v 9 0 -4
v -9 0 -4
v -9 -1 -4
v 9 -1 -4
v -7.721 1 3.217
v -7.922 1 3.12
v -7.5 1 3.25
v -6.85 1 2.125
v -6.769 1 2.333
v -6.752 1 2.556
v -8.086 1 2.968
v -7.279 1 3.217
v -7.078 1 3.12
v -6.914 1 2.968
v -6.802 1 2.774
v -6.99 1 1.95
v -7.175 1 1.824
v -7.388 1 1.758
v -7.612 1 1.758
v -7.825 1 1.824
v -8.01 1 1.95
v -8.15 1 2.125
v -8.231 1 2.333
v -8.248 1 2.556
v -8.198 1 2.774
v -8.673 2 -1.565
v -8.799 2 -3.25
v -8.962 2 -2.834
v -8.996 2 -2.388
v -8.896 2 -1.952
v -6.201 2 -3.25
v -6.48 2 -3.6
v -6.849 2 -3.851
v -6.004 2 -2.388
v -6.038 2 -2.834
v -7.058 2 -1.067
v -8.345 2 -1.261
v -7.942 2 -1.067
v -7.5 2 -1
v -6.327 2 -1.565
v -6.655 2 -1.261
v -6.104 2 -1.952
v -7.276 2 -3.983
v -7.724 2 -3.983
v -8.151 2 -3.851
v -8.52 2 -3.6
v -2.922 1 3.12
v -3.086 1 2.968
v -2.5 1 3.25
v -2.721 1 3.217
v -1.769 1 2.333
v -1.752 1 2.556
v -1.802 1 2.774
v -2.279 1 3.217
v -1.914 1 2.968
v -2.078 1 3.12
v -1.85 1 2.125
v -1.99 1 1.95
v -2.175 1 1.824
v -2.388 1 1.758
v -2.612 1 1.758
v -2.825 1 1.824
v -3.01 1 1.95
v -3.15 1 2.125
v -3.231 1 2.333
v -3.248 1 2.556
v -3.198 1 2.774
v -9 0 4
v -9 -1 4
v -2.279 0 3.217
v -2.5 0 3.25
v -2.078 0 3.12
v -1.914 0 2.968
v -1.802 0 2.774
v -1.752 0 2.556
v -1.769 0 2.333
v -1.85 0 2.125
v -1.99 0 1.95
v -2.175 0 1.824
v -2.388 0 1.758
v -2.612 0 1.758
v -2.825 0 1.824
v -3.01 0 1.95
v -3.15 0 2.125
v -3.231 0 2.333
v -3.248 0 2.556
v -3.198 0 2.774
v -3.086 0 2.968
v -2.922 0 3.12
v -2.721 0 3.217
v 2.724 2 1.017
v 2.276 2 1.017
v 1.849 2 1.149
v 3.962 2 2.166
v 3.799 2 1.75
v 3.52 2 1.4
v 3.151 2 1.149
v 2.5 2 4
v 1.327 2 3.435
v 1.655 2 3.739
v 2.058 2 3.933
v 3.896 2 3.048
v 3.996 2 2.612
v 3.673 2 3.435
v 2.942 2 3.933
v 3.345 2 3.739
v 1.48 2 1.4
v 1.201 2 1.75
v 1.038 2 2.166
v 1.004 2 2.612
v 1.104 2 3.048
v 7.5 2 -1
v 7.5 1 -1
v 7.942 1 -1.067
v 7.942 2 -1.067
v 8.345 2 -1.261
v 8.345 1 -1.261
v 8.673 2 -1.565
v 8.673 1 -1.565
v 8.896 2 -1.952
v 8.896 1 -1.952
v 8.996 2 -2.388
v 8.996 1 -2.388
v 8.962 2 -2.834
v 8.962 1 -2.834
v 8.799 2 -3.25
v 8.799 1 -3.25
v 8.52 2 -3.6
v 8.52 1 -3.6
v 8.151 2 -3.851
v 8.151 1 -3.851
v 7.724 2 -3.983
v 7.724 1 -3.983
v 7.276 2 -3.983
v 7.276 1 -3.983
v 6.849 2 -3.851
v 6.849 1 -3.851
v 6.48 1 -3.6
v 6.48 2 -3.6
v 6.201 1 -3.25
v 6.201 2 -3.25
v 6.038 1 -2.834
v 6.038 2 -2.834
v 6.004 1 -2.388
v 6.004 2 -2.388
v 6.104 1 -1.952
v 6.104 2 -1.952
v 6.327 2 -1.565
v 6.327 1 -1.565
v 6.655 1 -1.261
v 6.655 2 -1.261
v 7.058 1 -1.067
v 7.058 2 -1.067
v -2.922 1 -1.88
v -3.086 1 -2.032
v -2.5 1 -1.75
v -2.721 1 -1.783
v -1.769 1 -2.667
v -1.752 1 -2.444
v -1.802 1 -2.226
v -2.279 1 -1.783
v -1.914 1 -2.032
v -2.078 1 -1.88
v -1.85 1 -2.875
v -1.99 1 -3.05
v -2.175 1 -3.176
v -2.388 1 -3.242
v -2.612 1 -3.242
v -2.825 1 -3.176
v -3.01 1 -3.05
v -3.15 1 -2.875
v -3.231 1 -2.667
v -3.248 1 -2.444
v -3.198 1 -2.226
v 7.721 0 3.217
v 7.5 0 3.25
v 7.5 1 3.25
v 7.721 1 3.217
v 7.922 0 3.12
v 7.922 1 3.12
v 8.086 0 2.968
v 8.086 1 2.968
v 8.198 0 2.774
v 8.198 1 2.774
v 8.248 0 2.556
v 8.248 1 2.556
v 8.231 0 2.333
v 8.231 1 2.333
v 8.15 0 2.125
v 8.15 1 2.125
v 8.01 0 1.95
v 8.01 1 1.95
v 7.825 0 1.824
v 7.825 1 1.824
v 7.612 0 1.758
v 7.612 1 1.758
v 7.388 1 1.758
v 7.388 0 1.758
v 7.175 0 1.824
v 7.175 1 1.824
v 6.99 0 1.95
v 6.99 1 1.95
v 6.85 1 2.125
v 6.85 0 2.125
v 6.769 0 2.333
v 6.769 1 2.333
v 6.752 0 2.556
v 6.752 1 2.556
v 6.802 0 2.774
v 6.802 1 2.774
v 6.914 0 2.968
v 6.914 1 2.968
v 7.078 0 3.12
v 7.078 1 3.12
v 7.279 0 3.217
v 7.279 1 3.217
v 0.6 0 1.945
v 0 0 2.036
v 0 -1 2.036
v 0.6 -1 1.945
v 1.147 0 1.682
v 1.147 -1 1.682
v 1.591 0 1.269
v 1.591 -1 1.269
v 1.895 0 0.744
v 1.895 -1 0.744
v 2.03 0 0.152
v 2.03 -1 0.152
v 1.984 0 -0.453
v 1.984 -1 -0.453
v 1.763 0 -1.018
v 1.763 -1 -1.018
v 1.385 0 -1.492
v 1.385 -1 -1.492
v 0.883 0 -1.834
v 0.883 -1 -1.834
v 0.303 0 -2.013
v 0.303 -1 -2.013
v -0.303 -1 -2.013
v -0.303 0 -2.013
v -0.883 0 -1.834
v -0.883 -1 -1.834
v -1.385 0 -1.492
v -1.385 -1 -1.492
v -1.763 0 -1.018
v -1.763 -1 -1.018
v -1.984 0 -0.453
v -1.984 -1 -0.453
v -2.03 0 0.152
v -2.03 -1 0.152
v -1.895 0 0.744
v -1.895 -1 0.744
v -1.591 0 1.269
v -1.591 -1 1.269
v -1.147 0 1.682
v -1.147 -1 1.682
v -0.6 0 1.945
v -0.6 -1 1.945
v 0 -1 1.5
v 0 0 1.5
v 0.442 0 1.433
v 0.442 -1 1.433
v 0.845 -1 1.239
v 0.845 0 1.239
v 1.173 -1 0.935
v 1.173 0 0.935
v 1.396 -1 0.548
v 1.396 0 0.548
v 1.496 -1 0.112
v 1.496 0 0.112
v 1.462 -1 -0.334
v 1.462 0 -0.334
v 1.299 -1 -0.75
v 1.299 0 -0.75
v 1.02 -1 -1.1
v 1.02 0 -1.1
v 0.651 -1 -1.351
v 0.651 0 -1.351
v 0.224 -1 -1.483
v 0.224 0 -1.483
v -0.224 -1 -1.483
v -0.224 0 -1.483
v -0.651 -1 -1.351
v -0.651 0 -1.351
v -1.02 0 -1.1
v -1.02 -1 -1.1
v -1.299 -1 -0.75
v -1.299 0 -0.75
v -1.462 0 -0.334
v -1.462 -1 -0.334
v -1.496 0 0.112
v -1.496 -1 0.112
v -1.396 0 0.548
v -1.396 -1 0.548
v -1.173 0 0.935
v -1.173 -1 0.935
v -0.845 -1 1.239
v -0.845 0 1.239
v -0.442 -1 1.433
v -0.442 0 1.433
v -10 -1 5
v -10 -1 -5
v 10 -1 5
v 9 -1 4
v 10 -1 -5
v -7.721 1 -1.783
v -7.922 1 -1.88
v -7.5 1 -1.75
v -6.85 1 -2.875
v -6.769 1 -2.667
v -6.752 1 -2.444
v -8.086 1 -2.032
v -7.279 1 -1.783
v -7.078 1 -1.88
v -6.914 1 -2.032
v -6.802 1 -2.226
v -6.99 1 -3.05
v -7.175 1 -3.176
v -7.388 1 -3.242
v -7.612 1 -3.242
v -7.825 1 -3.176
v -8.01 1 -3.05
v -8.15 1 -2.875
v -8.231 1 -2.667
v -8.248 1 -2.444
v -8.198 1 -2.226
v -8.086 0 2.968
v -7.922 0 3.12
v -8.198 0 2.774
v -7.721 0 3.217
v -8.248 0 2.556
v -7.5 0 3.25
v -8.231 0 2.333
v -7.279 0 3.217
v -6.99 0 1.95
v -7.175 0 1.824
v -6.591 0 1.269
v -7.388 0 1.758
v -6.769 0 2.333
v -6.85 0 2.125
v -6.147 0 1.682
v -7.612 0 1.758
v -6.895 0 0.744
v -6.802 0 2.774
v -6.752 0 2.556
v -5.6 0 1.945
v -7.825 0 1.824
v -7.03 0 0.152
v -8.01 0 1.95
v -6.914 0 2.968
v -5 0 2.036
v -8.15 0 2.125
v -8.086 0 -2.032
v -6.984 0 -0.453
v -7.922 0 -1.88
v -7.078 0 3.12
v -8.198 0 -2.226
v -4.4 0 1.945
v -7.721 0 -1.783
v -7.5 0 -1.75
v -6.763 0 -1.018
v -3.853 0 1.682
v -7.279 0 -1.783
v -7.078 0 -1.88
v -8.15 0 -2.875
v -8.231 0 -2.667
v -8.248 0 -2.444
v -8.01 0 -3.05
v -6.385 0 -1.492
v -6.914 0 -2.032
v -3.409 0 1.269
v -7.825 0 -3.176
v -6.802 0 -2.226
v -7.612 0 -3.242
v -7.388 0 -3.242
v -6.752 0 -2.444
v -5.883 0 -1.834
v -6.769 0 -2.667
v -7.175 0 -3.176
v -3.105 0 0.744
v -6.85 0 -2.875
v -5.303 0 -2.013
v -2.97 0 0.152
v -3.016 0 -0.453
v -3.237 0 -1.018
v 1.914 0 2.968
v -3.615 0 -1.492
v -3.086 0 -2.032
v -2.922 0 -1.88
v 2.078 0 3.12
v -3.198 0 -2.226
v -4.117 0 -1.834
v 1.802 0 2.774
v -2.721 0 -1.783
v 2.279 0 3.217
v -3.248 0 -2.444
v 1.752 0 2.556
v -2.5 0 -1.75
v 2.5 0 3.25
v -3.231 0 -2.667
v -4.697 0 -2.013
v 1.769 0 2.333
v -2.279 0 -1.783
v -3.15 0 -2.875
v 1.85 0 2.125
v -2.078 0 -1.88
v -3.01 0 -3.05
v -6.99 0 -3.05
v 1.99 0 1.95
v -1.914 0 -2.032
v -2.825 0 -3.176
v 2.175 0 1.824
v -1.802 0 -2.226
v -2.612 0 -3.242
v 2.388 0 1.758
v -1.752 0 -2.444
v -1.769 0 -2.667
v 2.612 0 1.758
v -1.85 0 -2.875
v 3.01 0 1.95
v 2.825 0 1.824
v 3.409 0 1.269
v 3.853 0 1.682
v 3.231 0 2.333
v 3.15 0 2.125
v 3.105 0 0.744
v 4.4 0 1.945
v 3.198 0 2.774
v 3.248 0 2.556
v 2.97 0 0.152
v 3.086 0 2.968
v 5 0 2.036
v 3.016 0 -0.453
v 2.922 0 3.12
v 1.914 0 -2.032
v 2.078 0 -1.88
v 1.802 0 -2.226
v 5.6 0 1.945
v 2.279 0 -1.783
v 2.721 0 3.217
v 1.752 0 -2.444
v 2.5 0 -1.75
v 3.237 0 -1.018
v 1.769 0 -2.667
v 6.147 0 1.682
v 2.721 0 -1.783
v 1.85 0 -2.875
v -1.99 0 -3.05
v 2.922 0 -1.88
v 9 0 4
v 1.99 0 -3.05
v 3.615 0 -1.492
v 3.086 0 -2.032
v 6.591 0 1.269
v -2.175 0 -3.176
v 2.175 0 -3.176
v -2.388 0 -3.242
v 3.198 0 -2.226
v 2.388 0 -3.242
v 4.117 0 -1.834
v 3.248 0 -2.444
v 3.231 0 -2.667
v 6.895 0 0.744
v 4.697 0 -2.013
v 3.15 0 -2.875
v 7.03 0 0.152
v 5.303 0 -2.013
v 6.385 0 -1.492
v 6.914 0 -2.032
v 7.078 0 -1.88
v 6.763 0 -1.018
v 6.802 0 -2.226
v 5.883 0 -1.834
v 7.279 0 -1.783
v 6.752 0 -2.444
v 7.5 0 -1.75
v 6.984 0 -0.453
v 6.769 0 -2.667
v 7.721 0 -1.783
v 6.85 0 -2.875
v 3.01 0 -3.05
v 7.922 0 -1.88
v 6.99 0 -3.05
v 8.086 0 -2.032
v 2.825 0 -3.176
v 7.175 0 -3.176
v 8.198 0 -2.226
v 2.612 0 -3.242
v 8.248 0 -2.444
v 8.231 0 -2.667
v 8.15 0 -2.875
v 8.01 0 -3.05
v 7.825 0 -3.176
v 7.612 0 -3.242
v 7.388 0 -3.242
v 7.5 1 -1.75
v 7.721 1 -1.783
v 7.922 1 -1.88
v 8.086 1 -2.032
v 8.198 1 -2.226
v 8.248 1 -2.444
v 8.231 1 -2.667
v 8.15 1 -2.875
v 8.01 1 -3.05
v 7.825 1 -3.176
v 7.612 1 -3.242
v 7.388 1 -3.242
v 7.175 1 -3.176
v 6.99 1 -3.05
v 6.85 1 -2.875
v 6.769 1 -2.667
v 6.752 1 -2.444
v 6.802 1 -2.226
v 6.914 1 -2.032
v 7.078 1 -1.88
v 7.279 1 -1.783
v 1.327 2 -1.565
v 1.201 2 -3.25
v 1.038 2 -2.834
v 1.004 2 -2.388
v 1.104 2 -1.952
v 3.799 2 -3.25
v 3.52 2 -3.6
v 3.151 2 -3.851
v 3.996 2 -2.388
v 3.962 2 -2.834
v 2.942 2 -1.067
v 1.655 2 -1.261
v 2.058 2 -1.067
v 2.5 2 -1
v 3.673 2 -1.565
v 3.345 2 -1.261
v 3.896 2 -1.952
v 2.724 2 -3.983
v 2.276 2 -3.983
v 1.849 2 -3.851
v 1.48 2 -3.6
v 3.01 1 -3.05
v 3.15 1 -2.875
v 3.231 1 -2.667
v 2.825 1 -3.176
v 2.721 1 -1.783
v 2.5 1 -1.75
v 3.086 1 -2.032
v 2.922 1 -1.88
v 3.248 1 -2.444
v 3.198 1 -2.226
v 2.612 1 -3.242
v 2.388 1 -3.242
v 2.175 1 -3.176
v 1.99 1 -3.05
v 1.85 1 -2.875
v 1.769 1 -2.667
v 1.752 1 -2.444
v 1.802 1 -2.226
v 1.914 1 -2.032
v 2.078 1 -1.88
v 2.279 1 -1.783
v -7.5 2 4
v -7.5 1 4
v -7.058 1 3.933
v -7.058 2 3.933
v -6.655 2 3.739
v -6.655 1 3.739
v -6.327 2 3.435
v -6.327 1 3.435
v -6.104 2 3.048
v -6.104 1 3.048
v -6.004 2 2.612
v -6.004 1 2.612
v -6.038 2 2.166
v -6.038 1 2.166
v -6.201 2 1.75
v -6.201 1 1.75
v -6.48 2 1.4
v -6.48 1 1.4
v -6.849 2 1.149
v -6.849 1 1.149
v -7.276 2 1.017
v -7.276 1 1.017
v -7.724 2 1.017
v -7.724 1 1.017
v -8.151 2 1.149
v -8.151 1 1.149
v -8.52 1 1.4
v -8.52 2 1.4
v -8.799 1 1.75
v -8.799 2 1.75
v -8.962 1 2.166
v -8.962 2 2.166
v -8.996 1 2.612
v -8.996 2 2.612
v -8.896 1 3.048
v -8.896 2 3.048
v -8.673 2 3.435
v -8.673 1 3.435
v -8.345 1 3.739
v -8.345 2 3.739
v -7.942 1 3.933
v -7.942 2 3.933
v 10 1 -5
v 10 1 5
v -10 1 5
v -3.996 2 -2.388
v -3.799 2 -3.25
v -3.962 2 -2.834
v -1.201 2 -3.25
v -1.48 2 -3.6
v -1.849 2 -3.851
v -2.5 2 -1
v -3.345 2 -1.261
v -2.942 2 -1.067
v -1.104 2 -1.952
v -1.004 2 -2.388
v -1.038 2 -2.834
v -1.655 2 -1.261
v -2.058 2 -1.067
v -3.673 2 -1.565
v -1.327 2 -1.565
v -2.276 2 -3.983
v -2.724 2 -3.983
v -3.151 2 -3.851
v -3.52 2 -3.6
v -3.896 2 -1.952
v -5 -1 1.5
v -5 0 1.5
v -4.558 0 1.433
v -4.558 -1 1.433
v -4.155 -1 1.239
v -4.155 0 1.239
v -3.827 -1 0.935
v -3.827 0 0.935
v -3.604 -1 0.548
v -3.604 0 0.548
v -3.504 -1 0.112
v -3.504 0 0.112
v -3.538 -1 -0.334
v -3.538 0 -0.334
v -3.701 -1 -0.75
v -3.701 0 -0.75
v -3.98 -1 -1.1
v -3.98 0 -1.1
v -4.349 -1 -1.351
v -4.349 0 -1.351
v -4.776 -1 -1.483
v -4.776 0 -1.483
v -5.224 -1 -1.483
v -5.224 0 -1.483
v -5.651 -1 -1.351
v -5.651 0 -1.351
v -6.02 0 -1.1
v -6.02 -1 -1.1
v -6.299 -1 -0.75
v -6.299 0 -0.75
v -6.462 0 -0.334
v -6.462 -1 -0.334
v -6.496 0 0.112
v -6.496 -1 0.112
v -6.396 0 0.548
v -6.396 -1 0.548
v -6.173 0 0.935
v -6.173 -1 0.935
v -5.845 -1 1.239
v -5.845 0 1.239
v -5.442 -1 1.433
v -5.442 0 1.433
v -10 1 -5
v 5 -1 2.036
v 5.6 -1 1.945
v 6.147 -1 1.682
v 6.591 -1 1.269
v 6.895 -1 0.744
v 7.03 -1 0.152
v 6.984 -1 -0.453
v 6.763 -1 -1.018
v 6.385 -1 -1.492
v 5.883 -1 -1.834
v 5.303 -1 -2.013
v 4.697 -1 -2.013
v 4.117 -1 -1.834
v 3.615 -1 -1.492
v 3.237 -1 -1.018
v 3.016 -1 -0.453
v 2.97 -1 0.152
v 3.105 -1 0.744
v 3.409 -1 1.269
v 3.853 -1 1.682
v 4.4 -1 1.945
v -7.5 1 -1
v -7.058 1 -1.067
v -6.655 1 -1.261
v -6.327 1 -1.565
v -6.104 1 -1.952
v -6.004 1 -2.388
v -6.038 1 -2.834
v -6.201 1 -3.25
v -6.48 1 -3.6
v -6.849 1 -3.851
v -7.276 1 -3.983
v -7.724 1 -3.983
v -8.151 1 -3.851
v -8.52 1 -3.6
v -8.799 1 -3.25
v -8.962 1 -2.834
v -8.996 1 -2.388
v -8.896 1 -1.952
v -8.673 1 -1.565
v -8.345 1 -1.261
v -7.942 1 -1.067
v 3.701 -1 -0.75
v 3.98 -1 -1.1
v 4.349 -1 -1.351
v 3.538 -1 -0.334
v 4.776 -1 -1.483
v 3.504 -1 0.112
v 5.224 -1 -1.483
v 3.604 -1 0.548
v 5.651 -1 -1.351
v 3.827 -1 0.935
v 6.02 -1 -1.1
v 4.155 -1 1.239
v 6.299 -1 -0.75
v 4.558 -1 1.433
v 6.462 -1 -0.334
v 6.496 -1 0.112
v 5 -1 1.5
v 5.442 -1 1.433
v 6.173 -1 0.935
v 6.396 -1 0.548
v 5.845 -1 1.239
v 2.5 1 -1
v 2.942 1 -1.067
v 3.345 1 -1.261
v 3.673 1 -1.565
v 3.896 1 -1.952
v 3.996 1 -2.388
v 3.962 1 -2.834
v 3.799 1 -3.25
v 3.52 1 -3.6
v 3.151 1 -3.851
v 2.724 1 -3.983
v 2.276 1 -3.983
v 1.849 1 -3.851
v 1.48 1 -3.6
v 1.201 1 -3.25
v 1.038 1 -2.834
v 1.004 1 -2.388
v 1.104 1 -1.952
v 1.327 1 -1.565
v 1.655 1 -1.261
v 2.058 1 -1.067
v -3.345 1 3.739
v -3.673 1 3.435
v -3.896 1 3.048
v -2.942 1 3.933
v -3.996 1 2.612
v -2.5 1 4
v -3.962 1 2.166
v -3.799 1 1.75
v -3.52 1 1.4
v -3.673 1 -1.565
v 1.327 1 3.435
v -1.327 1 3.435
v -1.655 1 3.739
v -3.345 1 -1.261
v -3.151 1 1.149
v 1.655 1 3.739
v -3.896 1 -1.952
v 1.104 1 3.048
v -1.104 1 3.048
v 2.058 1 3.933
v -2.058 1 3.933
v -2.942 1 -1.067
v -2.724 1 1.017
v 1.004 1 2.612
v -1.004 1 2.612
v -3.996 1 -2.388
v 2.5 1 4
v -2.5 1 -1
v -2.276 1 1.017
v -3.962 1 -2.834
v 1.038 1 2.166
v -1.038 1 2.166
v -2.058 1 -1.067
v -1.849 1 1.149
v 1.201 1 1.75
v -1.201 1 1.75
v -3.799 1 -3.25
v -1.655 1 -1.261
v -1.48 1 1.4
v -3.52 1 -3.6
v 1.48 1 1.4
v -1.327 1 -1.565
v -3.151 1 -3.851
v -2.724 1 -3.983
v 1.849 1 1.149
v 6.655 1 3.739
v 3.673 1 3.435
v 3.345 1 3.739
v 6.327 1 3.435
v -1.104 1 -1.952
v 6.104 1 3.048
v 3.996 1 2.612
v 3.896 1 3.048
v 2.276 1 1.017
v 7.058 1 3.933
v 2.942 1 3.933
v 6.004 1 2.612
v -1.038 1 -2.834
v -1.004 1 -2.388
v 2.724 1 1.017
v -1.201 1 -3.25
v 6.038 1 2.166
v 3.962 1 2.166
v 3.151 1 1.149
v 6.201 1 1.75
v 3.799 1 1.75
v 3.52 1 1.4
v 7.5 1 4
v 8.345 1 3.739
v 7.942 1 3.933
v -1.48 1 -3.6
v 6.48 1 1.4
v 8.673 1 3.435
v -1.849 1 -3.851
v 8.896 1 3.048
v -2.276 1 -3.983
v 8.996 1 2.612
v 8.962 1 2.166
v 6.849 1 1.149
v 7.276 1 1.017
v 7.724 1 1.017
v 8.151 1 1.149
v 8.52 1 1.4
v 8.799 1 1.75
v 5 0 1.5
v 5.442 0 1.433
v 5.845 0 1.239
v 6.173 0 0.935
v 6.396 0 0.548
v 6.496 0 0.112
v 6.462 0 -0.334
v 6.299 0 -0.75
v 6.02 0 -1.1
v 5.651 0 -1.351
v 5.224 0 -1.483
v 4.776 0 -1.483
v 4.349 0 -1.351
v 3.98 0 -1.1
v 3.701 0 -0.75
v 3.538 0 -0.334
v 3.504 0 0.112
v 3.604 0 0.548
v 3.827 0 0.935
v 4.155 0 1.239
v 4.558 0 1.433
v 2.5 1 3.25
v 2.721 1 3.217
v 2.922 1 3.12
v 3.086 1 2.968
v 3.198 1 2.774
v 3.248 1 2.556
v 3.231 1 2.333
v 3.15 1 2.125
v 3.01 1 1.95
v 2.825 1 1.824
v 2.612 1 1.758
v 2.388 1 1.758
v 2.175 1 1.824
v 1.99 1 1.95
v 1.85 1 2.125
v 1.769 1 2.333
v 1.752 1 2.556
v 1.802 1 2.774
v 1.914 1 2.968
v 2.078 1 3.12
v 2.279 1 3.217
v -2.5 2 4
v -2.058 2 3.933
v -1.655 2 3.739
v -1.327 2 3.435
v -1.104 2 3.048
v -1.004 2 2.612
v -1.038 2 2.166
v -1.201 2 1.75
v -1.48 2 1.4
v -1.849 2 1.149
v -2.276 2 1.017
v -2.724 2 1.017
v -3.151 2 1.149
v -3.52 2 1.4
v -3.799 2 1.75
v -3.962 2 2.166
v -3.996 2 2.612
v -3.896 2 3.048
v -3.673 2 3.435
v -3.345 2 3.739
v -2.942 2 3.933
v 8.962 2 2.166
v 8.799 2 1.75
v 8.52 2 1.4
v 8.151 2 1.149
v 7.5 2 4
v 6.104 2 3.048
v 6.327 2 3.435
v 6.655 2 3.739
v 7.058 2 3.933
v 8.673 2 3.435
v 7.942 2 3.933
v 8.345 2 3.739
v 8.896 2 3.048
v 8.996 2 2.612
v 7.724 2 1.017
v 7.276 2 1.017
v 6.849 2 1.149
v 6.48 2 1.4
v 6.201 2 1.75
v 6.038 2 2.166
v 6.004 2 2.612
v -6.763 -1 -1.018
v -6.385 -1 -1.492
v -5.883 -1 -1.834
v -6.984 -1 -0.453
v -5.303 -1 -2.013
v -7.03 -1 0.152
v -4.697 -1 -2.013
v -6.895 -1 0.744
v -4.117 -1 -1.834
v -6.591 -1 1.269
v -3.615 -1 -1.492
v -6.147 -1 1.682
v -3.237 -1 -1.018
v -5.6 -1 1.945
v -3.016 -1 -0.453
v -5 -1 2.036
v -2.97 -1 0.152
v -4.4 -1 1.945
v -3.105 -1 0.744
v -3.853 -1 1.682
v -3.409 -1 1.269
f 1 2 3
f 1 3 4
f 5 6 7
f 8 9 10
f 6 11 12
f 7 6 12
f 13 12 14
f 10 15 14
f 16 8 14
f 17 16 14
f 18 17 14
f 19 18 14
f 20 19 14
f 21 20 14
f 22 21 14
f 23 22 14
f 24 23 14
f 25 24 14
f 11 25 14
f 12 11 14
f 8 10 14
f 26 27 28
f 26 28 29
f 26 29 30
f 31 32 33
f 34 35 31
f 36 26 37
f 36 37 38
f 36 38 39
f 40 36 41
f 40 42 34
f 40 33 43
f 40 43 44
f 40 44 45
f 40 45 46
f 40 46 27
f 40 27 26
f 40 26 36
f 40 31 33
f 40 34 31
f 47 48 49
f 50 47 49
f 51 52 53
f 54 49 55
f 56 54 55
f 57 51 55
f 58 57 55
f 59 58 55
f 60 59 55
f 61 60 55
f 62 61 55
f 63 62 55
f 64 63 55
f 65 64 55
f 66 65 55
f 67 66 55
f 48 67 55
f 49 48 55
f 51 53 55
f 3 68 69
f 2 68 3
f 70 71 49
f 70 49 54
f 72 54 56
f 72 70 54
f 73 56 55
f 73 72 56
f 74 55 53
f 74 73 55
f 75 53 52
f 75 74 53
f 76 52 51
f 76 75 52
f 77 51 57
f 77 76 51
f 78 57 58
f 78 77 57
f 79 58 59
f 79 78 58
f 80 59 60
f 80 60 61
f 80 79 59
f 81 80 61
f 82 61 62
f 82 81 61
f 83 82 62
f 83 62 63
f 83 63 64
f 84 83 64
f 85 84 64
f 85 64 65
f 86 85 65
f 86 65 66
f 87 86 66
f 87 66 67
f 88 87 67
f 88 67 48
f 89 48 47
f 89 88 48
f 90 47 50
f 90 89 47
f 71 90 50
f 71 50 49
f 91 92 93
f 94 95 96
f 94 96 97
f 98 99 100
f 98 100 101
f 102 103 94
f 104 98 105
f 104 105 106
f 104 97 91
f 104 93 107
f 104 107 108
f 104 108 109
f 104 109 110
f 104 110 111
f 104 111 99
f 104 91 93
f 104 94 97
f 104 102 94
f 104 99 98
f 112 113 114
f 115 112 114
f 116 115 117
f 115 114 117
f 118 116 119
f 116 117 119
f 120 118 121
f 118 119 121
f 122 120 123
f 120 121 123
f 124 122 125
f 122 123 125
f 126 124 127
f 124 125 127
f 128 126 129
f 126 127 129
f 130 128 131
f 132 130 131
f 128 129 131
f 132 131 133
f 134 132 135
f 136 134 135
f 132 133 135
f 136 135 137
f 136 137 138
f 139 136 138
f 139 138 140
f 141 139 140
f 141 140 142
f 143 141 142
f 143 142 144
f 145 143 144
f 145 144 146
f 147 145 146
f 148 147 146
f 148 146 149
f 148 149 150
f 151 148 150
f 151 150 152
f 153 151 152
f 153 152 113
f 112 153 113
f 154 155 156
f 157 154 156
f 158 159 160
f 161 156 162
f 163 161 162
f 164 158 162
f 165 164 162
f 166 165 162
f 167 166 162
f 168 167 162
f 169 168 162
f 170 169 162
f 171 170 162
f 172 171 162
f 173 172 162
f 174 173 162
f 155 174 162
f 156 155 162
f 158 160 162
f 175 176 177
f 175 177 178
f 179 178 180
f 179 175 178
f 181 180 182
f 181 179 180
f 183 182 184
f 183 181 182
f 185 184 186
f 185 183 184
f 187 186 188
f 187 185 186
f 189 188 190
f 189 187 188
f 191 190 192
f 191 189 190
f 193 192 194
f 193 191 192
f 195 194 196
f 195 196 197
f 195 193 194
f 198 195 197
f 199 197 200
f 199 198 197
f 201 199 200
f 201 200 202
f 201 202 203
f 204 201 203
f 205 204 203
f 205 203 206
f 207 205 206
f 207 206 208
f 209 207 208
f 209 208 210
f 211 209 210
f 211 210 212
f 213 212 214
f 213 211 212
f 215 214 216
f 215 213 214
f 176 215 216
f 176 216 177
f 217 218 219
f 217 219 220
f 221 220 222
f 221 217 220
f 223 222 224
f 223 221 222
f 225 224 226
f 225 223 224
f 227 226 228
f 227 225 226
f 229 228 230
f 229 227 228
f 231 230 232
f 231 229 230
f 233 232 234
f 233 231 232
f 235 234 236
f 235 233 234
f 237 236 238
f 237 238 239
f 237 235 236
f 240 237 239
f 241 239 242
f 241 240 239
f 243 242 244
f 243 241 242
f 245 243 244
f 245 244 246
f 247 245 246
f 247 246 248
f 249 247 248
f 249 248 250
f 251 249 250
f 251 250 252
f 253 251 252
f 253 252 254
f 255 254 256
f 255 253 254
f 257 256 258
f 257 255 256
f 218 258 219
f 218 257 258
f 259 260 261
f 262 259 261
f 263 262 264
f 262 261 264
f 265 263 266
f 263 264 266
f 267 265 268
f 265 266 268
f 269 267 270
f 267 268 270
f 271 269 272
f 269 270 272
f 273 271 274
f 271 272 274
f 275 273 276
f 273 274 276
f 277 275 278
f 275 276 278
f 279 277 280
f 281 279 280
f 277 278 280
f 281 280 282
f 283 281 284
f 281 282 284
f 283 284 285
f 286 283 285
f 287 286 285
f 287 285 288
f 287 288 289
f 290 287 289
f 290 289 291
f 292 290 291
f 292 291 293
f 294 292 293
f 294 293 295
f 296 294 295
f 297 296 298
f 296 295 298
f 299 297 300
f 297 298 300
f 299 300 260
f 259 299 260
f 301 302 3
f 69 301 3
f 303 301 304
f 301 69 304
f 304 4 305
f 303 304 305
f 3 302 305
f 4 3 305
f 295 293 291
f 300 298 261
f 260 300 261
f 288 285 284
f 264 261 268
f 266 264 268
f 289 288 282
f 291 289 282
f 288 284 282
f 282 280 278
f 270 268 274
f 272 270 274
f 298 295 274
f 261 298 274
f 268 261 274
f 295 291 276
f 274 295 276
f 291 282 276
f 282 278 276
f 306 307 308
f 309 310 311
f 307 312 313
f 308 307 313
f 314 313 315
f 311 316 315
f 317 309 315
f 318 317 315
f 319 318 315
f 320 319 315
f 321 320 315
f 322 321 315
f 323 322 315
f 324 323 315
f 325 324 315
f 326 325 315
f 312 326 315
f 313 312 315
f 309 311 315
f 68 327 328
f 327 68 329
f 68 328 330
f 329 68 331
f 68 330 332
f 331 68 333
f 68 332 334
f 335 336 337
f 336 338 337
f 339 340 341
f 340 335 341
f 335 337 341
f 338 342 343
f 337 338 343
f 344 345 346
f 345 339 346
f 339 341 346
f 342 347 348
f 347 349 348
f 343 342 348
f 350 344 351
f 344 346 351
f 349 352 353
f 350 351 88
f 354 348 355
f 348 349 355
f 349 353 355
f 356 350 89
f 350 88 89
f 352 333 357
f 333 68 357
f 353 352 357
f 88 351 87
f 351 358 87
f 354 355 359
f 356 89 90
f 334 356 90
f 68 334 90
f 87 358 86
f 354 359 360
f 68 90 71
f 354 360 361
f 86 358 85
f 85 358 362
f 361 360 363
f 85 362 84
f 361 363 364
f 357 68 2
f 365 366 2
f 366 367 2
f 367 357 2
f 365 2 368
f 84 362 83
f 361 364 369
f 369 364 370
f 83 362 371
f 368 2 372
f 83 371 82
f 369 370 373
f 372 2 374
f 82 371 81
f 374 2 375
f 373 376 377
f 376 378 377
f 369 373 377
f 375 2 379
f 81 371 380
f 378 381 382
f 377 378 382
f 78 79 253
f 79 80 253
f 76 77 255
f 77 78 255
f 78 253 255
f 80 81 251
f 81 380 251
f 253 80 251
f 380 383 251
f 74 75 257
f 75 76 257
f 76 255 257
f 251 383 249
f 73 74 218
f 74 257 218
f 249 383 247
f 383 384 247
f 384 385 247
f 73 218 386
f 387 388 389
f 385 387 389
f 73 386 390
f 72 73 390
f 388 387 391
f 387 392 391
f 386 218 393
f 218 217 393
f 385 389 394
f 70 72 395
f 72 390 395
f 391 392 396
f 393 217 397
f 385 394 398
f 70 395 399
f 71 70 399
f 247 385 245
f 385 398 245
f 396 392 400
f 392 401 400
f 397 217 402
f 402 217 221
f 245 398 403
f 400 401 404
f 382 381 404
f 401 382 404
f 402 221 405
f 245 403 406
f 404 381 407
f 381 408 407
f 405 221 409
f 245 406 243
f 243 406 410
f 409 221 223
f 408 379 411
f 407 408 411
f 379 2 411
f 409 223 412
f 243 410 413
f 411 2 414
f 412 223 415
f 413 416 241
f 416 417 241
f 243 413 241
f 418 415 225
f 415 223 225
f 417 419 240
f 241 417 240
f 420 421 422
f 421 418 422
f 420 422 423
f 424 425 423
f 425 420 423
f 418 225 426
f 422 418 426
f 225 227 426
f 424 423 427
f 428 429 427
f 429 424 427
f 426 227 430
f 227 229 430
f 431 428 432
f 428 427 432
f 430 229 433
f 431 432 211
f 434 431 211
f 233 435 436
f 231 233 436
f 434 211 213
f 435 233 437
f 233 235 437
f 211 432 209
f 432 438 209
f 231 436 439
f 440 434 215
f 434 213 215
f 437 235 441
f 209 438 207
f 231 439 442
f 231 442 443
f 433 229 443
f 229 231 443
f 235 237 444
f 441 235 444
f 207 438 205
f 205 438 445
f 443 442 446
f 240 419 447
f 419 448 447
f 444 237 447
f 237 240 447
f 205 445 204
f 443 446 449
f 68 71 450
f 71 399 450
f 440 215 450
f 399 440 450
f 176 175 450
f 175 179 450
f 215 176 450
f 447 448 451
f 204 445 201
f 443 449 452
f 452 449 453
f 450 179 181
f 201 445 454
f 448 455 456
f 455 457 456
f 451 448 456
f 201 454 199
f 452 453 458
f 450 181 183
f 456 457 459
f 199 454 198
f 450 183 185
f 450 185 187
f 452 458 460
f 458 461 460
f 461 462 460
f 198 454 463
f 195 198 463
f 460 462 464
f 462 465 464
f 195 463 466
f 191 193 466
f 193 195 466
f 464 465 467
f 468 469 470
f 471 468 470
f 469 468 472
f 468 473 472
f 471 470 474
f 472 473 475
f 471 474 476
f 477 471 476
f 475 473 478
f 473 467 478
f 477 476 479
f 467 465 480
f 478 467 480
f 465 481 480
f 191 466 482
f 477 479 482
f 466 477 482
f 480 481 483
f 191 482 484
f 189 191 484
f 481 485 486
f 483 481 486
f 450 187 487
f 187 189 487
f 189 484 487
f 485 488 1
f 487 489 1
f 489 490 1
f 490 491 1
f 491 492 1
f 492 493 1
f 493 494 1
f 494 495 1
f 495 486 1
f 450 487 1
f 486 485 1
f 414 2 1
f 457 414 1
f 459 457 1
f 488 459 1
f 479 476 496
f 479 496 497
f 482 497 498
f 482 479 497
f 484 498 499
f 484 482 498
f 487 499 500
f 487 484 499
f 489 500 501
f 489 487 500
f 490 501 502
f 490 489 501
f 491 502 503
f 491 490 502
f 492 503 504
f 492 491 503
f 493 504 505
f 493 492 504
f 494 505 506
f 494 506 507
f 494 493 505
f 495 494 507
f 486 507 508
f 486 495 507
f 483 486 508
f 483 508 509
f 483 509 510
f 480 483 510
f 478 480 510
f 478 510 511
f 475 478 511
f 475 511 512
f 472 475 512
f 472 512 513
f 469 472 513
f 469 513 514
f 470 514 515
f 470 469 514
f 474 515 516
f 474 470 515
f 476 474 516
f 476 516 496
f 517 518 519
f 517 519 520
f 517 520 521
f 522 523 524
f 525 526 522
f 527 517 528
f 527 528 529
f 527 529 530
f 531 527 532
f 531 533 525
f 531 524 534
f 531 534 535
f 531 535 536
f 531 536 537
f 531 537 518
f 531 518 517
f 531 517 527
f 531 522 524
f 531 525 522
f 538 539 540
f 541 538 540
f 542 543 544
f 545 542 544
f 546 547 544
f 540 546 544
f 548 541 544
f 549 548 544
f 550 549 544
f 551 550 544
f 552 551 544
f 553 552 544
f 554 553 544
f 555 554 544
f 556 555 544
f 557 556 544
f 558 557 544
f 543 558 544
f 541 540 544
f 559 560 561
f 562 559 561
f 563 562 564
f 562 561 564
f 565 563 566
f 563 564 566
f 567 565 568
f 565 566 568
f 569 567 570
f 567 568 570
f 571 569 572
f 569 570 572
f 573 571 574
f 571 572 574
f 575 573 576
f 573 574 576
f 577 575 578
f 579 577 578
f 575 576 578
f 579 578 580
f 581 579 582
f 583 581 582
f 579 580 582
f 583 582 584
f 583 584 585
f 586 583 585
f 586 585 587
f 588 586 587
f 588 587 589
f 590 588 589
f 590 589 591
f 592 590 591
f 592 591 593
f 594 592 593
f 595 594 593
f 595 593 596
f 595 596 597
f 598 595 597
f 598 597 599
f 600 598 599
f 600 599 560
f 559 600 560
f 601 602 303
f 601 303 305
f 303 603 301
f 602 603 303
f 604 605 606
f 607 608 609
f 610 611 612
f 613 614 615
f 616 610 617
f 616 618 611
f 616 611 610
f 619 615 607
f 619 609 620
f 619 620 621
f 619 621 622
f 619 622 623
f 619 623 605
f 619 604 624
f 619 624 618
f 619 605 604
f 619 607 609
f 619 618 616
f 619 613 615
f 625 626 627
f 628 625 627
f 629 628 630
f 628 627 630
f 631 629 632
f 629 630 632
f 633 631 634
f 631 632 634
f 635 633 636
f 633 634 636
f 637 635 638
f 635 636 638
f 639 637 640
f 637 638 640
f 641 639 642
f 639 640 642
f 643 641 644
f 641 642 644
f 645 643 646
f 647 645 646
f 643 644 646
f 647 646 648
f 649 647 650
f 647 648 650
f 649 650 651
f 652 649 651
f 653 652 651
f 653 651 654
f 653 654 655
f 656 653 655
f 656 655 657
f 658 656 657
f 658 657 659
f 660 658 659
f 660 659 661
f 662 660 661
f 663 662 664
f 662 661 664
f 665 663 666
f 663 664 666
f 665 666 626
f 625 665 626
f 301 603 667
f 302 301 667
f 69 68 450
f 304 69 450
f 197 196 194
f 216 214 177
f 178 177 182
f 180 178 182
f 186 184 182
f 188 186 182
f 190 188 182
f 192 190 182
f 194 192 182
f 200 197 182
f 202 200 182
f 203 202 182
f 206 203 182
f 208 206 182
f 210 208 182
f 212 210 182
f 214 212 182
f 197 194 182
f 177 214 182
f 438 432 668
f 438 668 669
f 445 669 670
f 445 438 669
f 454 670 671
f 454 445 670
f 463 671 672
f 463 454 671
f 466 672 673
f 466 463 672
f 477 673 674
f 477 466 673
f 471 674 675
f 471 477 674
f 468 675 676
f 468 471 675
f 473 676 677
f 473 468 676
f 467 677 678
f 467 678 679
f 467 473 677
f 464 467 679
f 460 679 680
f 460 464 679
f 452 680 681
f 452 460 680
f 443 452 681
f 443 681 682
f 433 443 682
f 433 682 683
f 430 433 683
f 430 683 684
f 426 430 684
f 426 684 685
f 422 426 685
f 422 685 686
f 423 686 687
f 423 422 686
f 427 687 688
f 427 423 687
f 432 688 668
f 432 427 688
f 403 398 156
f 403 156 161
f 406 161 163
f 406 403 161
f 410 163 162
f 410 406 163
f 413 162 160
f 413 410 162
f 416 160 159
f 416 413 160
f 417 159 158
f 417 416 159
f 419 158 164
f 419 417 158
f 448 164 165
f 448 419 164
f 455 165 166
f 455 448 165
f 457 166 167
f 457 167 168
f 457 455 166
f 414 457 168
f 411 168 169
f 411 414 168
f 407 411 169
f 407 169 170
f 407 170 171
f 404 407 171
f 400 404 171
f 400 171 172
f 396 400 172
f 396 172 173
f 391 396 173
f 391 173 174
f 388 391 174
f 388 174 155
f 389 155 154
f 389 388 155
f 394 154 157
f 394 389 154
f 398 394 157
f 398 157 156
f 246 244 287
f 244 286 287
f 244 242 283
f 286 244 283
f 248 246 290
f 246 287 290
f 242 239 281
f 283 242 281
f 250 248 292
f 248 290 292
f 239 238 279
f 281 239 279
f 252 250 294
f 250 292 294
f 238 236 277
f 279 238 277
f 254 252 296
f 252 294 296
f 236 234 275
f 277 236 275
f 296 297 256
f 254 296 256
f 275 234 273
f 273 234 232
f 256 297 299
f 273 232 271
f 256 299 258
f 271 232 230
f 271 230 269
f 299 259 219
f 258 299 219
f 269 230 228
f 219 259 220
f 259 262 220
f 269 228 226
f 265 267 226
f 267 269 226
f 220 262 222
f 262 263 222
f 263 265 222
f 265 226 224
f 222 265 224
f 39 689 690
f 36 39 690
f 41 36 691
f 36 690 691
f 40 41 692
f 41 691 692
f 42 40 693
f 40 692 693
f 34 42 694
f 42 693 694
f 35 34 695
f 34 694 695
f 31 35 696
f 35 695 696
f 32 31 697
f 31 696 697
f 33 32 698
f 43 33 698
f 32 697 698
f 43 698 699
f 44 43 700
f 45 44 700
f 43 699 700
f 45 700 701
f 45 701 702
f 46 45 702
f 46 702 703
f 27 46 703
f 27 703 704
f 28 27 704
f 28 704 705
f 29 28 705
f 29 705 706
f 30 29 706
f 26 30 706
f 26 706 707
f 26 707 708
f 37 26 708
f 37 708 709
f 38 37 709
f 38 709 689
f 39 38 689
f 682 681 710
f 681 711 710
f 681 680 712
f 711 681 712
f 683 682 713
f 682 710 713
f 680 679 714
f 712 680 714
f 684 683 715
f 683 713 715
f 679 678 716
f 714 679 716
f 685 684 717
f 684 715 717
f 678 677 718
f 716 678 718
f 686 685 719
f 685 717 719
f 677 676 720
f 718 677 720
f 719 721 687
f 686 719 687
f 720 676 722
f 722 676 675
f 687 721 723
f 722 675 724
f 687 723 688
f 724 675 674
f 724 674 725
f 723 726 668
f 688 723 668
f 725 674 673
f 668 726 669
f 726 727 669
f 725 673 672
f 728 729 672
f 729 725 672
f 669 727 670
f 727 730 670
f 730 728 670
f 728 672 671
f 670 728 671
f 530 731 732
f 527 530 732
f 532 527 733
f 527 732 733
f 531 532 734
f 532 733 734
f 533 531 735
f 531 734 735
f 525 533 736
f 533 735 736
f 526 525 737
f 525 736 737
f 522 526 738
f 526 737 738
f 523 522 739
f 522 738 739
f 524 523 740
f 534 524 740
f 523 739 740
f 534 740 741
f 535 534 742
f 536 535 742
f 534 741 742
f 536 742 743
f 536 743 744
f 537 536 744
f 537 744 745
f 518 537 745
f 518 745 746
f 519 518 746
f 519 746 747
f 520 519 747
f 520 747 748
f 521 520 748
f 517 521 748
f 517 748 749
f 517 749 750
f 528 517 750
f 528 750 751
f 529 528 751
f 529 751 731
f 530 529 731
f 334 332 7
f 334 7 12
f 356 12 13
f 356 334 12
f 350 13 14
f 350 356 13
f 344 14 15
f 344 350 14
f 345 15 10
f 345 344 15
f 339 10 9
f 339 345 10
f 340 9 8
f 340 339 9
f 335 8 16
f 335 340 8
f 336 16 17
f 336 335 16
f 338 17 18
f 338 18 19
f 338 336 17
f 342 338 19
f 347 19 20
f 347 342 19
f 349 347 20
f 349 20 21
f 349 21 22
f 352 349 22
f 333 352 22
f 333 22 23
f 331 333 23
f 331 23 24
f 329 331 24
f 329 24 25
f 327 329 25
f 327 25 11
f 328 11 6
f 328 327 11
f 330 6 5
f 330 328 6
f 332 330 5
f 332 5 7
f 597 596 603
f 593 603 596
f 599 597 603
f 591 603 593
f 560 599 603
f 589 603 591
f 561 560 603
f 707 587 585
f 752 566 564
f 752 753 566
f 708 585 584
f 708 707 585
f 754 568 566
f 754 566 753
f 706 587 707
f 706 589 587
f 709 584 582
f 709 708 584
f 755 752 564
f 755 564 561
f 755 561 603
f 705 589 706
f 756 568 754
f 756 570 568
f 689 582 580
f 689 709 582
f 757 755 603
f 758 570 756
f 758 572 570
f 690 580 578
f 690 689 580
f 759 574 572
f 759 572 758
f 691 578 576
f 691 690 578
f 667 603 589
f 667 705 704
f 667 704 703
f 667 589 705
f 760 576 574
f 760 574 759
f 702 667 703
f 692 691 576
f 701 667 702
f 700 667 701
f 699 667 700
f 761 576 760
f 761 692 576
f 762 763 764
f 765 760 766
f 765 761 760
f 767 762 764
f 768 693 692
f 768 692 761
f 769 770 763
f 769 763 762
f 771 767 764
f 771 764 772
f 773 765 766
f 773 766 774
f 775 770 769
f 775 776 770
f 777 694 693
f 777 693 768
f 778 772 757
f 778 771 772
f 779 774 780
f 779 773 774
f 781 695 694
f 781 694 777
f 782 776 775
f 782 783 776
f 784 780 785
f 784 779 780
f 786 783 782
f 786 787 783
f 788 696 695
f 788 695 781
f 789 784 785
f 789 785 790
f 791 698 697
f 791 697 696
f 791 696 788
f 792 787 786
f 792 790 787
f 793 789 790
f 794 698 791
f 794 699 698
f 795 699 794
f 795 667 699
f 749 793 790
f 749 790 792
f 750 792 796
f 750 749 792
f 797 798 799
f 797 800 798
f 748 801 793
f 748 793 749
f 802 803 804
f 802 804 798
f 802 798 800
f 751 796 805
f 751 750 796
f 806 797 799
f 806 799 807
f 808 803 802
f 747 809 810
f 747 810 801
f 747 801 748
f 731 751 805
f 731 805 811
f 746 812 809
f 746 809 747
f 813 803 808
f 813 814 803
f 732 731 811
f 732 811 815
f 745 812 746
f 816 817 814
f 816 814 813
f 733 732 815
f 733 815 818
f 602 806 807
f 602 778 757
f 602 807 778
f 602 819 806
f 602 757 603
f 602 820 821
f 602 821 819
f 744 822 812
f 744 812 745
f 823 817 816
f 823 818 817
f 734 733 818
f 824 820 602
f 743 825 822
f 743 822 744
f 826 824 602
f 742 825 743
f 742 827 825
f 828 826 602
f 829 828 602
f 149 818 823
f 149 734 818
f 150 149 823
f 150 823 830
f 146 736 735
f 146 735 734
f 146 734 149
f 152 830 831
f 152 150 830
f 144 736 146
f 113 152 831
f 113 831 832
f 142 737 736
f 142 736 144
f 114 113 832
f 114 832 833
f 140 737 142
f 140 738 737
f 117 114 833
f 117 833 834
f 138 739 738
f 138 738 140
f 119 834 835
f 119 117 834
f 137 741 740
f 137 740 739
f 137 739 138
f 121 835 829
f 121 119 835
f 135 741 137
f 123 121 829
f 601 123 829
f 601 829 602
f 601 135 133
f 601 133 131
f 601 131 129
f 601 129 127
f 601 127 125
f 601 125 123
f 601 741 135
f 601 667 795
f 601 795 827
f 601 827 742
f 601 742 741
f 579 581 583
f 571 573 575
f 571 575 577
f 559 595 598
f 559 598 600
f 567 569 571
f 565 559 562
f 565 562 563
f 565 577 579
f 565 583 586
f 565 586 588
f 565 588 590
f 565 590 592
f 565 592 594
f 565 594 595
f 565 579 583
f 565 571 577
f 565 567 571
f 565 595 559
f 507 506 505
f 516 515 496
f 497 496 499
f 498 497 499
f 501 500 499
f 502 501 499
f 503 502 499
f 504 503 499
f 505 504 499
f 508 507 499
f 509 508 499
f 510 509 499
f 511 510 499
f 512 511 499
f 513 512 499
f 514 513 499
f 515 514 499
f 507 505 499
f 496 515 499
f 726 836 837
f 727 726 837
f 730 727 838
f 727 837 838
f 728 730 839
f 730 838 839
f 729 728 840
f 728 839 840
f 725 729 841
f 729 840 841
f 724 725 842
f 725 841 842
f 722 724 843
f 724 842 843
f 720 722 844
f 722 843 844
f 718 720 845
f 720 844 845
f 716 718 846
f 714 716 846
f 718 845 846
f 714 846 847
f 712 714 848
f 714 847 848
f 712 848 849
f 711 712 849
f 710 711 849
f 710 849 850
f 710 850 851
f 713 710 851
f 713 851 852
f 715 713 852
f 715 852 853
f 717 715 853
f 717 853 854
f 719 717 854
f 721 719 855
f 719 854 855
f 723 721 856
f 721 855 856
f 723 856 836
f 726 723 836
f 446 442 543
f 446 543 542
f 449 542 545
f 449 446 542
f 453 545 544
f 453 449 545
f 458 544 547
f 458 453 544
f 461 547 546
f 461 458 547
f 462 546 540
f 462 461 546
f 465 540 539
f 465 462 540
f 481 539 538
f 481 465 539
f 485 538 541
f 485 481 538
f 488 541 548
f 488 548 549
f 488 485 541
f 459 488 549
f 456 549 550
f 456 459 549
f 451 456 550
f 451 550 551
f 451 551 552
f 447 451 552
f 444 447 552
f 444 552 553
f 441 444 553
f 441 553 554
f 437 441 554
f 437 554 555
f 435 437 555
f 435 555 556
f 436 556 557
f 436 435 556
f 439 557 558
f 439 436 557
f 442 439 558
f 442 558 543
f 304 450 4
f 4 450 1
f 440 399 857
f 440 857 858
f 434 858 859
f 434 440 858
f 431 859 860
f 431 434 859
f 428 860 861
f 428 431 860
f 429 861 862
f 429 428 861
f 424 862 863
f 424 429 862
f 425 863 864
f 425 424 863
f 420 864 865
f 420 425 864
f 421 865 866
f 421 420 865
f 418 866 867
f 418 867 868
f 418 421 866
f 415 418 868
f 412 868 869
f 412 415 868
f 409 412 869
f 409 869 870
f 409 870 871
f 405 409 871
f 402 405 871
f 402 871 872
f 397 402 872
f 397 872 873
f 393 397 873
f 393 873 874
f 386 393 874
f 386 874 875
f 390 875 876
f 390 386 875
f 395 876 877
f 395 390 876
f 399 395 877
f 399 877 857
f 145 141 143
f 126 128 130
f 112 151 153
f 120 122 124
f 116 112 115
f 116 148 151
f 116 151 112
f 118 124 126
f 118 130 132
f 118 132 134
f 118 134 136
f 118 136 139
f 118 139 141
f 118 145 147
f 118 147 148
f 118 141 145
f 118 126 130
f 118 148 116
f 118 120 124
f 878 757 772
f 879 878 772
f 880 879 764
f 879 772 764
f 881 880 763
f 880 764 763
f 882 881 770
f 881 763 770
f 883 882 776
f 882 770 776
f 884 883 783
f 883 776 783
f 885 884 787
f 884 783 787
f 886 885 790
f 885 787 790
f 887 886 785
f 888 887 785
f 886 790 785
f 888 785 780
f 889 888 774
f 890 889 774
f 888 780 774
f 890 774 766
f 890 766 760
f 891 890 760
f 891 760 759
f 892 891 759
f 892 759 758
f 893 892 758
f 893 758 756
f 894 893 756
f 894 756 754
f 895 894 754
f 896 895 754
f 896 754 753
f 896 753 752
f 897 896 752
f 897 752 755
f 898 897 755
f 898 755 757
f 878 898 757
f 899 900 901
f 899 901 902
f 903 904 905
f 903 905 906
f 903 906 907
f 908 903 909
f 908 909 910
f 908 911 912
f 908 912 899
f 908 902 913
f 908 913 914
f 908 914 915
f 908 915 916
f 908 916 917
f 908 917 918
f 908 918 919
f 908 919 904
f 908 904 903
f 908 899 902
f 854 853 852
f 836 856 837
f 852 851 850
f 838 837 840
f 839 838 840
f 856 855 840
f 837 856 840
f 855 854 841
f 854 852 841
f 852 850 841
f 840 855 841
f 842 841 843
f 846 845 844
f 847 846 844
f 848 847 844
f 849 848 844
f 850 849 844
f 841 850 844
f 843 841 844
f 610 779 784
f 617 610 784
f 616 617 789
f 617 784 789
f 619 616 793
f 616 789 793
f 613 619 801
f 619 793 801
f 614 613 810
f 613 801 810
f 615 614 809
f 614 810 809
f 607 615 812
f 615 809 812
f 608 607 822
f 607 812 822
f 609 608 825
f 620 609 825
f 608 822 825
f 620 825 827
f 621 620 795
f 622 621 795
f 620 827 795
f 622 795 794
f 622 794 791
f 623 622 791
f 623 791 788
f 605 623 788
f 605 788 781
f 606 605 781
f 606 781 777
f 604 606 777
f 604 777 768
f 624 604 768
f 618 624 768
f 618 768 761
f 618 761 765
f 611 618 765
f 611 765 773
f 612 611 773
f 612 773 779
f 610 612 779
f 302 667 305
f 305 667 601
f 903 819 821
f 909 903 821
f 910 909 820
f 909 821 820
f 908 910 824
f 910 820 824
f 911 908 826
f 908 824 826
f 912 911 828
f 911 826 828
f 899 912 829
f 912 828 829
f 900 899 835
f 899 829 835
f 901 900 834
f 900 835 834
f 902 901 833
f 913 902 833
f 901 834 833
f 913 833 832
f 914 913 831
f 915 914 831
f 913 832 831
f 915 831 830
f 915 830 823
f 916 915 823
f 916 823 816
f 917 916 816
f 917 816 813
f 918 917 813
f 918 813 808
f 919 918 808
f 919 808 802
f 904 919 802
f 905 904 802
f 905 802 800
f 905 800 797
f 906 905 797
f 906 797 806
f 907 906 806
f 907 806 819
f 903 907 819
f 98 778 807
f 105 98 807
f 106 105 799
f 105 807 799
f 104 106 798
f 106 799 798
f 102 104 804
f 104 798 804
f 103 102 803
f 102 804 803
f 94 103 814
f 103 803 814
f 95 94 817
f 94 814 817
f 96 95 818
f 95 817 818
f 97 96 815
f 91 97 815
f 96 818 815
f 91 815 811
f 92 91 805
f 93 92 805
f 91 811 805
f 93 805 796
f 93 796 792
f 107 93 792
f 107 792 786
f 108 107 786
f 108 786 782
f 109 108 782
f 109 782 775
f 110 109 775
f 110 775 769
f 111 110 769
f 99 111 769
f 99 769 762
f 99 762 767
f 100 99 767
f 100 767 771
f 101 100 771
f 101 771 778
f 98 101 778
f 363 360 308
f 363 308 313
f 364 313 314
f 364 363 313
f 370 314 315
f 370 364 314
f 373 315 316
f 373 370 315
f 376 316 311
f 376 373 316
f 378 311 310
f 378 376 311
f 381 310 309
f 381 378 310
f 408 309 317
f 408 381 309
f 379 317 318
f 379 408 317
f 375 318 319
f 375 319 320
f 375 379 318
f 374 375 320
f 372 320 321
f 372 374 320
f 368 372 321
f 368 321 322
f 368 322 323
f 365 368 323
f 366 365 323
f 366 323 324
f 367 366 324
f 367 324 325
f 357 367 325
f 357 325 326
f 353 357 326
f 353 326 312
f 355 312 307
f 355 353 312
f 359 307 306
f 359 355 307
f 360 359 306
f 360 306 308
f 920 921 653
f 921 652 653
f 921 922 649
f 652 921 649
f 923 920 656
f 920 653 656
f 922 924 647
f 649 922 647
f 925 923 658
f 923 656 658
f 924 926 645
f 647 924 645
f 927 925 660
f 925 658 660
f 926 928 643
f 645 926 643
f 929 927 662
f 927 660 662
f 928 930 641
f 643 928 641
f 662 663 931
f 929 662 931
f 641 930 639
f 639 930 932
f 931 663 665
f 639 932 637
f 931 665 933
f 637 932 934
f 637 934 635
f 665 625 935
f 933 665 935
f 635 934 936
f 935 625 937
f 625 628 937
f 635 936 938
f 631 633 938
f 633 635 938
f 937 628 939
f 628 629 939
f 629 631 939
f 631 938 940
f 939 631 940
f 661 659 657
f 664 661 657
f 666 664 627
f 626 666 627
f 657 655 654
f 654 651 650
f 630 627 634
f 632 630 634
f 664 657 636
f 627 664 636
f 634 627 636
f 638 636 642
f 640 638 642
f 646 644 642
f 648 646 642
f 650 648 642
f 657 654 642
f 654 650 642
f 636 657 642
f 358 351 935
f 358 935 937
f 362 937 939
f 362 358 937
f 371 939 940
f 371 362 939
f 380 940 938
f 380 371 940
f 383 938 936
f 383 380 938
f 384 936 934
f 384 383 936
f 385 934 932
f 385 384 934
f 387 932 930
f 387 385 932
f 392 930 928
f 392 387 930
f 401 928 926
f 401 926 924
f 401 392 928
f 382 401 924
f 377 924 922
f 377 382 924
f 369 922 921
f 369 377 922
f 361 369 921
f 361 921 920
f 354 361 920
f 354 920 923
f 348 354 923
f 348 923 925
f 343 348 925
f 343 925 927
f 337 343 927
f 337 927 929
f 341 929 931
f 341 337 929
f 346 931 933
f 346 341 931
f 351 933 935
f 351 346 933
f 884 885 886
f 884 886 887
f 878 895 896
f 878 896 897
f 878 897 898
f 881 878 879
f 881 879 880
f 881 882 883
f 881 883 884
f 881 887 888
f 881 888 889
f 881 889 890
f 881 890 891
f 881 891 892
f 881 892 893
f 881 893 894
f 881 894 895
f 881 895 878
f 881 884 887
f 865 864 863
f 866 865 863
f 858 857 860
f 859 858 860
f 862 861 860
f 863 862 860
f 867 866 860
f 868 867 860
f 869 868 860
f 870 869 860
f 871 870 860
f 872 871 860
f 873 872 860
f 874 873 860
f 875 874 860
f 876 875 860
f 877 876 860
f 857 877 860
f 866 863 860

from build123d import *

# Parameters (mm, degrees)
SKETCH1_R             = 1.5
BOSS_EXTRUDE1_DEPTH   = 2
BOSS_EXTRUDE1_2_DEPTH = 2
BOSS_EXTRUDE1_3_DEPTH = 2
BOSS_EXTRUDE1_4_DEPTH = 2
BOSS_EXTRUDE1_5_DEPTH = 2
BOSS_EXTRUDE1_6_DEPTH = 2
BOSS_EXTRUDE1_7_DEPTH = 2
BOSS_EXTRUDE1_8_DEPTH = 2
SKETCH1_3_W           = 20
SKETCH1_3_H           = 10
BOSS_EXTRUDE2_DEPTH   = 1
SKETCH1_4_R           = 0.75
CUT_EXTRUDE1_DEPTH    = 1
SKETCH1_5_W           = 20
SKETCH1_5_H           = 10
SKETCH1_5_W_2         = 18
SKETCH1_5_H_2         = 8
SKETCH1_5_R           = 2.035533906
SKETCH1_5_R_2         = 1.5
BOSS_EXTRUDE3_DEPTH   = 1


with BuildPart() as part:
    # Sketch1 → Boss-Extrude1 (new body)
    with BuildSketch(Plane(origin=(0, 0, 0), x_dir=(1, 0, 0), z_dir=(0, 1, 0))):
        with Locations((-7.5, -2.5)):
            Circle(SKETCH1_R)
    extrude(amount=BOSS_EXTRUDE1_DEPTH)



with BuildPart() as body_2:
    # Sketch1 → Boss-Extrude1 2 (new body)
    with BuildSketch(Plane(origin=(0, 0, 0), x_dir=(1, 0, 0), z_dir=(0, 1, 0))):
        with Locations((-2.5, -2.5)):
            Circle(SKETCH1_R)
    extrude(amount=BOSS_EXTRUDE1_2_DEPTH)


with BuildPart() as body_3:
    # Sketch1 → Boss-Extrude1 3 (new body)
    with BuildSketch(Plane(origin=(0, 0, 0), x_dir=(1, 0, 0), z_dir=(0, 1, 0))):
        with Locations((-7.5, 2.5)):
            Circle(SKETCH1_R)
    extrude(amount=BOSS_EXTRUDE1_3_DEPTH)


with BuildPart() as body_4:
    # Sketch1 → Boss-Extrude1 4 (new body)
    with BuildSketch(Plane(origin=(0, 0, 0), x_dir=(1, 0, 0), z_dir=(0, 1, 0))):
        with Locations((2.5, -2.5)):
            Circle(SKETCH1_R)
    extrude(amount=BOSS_EXTRUDE1_4_DEPTH)


with BuildPart() as body_5:
    # Sketch1 → Boss-Extrude1 5 (new body)
    with BuildSketch(Plane(origin=(0, 0, 0), x_dir=(1, 0, 0), z_dir=(0, 1, 0))):
        with Locations((7.5, -2.5)):
            Circle(SKETCH1_R)
    extrude(amount=BOSS_EXTRUDE1_5_DEPTH)


with BuildPart() as body_6:
    # Sketch1 → Boss-Extrude1 6 (new body)
    with BuildSketch(Plane(origin=(0, 0, 0), x_dir=(1, 0, 0), z_dir=(0, 1, 0))):
        with Locations((-2.5, 2.5)):
            Circle(SKETCH1_R)
    extrude(amount=BOSS_EXTRUDE1_6_DEPTH)


with BuildPart() as body_7:
    # Sketch1 → Boss-Extrude1 7 (new body)
    with BuildSketch(Plane(origin=(0, 0, 0), x_dir=(1, 0, 0), z_dir=(0, 1, 0))):
        with Locations((2.5, 2.5)):
            Circle(SKETCH1_R)
    extrude(amount=BOSS_EXTRUDE1_7_DEPTH)


with BuildPart() as body_8:
    # Sketch1 → Boss-Extrude1 8 (new body)
    with BuildSketch(Plane(origin=(0, 0, 0), x_dir=(1, 0, 0), z_dir=(0, 1, 0))):
        with Locations((7.5, 2.5)):
            Circle(SKETCH1_R)
    extrude(amount=BOSS_EXTRUDE1_8_DEPTH)


with BuildPart() as part_1:
    add(part.part)

    add(body_2.part)  # Boss-Extrude2 merges body 2

    add(body_3.part)  # Boss-Extrude2 merges body 3

    add(body_4.part)  # Boss-Extrude2 merges body 4

    add(body_5.part)  # Boss-Extrude2 merges body 5

    add(body_6.part)  # Boss-Extrude2 merges body 6

    add(body_7.part)  # Boss-Extrude2 merges body 7

    add(body_8.part)  # Boss-Extrude2 merges body 8
    # Sketch1<3> → Boss-Extrude2 (add)
    with BuildSketch(Plane(origin=(0, 0, 0), x_dir=(1, 0, 0), z_dir=(0, 1, 0))):
        Rectangle(SKETCH1_3_W, SKETCH1_3_H)
    extrude(amount=BOSS_EXTRUDE2_DEPTH)

    # Sketch1<4> → Cut-Extrude1 (cut)
    with BuildSketch(Plane(origin=(0, 0, 0), x_dir=(1, 0, 0), z_dir=(0, 1, 0))):
        with Locations((-7.5, 2.5)):
            Circle(SKETCH1_4_R)
        with Locations((-2.5, 2.5)):
            Circle(SKETCH1_4_R)
        with Locations((2.5, 2.5)):
            Circle(SKETCH1_4_R)
        with Locations((7.5, 2.5)):
            Circle(SKETCH1_4_R)
        with Locations((-2.5, -2.5)):
            Circle(SKETCH1_4_R)
        with Locations((2.5, -2.5)):
            Circle(SKETCH1_4_R)
        with Locations((7.5, -2.5)):
            Circle(SKETCH1_4_R)
        with Locations((-7.5, -2.5)):
            Circle(SKETCH1_4_R)
    extrude(amount=CUT_EXTRUDE1_DEPTH, mode=Mode.SUBTRACT)

    # Sketch1<5> → Boss-Extrude3 (add)
    # profile 1 of 4: a face of its own
    with BuildSketch(Plane(origin=(0, 0, 0), x_dir=(1, 0, 0), z_dir=(0, 1, 0))):
        Rectangle(SKETCH1_5_W, SKETCH1_5_H)
        Rectangle(SKETCH1_5_W_2, SKETCH1_5_H_2, mode=Mode.SUBTRACT)
    # profile 2 of 4: a face of its own
    with BuildSketch(Plane(origin=(0, 0, 0), x_dir=(1, 0, 0), z_dir=(0, 1, 0))):
        with Locations((-5, 0)):
            Circle(SKETCH1_5_R)
        with Locations((-5, 0)):
            Circle(SKETCH1_5_R_2, mode=Mode.SUBTRACT)
    # profile 3 of 4: a face of its own
    with BuildSketch(Plane(origin=(0, 0, 0), x_dir=(1, 0, 0), z_dir=(0, 1, 0))):
        Circle(SKETCH1_5_R)
        Circle(SKETCH1_5_R_2, mode=Mode.SUBTRACT)
    # profile 4 of 4: a face of its own
    with BuildSketch(Plane(origin=(0, 0, 0), x_dir=(1, 0, 0), z_dir=(0, 1, 0))):
        with Locations((5, 0)):
            Circle(SKETCH1_5_R)
        with Locations((5, 0)):
            Circle(SKETCH1_5_R_2, mode=Mode.SUBTRACT)
    extrude(amount=-BOSS_EXTRUDE3_DEPTH)


solid = part_1.part
